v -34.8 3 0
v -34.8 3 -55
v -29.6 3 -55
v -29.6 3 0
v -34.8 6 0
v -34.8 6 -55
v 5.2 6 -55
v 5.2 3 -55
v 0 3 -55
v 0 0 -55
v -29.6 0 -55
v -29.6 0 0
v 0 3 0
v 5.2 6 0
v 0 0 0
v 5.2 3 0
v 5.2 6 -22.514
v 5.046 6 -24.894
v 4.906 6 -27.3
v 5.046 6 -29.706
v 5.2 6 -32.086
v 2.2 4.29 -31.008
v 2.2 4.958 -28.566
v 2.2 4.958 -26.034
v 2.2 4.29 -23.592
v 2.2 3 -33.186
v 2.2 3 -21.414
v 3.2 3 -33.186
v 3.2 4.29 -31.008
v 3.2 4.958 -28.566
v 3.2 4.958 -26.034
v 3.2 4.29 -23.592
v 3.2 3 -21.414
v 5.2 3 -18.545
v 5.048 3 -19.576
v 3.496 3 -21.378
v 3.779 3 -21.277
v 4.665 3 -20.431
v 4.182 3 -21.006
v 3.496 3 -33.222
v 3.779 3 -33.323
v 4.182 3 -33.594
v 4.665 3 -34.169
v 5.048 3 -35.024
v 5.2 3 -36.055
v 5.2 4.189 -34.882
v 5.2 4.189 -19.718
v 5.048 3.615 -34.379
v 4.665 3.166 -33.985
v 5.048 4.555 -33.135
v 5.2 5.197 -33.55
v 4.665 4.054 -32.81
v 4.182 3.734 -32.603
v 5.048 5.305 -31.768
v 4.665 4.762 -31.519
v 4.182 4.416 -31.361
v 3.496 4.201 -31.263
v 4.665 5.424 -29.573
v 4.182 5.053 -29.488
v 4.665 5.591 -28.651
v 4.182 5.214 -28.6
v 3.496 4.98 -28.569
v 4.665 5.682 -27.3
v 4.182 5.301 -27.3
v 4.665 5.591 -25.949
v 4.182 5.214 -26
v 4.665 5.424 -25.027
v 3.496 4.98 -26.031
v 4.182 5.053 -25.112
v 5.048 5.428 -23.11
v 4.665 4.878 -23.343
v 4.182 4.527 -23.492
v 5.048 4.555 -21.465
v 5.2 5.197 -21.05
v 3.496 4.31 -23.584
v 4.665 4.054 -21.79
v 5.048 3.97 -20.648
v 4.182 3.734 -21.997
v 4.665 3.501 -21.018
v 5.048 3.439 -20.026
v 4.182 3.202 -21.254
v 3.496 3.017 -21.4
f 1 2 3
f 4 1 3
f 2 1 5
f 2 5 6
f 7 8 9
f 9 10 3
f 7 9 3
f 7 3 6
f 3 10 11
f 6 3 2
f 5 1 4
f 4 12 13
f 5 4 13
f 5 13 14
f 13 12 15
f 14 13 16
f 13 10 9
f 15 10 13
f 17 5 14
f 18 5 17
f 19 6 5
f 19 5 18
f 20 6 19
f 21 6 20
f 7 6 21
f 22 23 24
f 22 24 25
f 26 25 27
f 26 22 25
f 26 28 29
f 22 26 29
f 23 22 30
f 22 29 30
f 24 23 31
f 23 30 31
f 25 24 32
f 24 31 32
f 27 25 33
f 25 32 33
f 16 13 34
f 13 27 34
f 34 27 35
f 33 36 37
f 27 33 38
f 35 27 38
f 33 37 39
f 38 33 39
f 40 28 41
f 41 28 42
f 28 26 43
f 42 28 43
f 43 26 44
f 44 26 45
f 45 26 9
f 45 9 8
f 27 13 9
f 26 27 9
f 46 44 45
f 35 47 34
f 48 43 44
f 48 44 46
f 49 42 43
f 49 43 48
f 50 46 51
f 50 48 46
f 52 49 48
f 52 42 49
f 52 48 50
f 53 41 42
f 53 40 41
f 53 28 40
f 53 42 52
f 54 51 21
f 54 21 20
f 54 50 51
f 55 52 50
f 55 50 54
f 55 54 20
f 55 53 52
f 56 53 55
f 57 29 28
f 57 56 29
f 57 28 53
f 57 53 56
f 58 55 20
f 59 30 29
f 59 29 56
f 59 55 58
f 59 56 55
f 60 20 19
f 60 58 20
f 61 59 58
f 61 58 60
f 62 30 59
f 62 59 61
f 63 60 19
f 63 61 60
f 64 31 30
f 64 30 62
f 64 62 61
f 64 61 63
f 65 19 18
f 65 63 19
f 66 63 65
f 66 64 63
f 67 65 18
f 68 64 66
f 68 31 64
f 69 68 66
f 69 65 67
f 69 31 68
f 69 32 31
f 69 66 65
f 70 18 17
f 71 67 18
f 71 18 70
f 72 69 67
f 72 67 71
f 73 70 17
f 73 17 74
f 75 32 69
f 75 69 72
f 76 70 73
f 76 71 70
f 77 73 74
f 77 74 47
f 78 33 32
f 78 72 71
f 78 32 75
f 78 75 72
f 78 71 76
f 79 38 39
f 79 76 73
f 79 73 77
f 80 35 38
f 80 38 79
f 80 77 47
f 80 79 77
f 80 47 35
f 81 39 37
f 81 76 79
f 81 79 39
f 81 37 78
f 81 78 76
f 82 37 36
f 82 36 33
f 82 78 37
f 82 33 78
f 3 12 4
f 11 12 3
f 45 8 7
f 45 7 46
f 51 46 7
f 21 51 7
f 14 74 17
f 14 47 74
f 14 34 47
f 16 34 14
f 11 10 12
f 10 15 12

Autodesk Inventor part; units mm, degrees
ref_plane "YZ Plane" through (0, 0, 0) normal (1, 0, 0) x (0, 1, 0)
ref_plane "XZ Plane" through (0, 0, 0) normal (0, 1, 0) x (-1, 0, 0)
ref_plane "XY Plane" through (0, 0, 0) normal (0, 0, 1) x (1, 0, 0)
sketch "스케치1" plane through (0, 0, 0) normal (0, 1, 0) x (-1, 0, 0)
  line L0 (0, 0) -> (29.6, 0)
  line L1 (29.6, 0) -> (29.6, -55)
  line L2 (29.6, -55) -> (0, -55)
  line L3 (0, -55) -> (0, 0)
  dimension "d0" = 29.6
  dimension "d1" = 55
extrude "돌출1" add sketch "스케치1" along normal blind 3
sketch "스케치2" plane through (0, 3, 0) normal (0, 1, 0) x (1, 0, 0)
  line L0 (0, 55) -> (-29.6, 55) projected
  line L1 (-29.6, 55) -> (-29.6, 0) projected
  line L2 (-29.6, 0) -> (0, 0) projected
  line L3 (0, 0) -> (0, 55) projected
  line L4 (5.2, 0) -> (-34.8, 0)
  line L5 (-34.8, 0) -> (-34.8, 55)
  line L6 (-34.8, 55) -> (5.2, 55)
  line L7 (5.2, 55) -> (5.2, 0)
  line L8 (0, 55) -> (-29.6, 55) projected
  point P0 (-14.8, 0)
  point P1 (0, 55)
  point P2 (-29.6, 55)
  dimension "d4" = 40
  dimension "d5" = 20
extrude "돌출2" add sketch "스케치2" along normal blind 3
sketch "스케치3" plane through (5.2, 3, 0) normal (1, 0, 0) x (0, 0, -1)
  line L0 (0, 0) -> (55, 0) projected
  line L1 (55, 0) -> (55, 3) projected
  line L2 (0, 3) -> (55, 3) projected
  line L3 (0, 0) -> (0, 3) projected
  circle A0 centre (27.3, -7.4568) radius 9.5
  point P0 (0, -3)
  point P1 (33.1861, 0)
  point P2 (21.4139, 0)
  dimension "d8" = 19
extrude "돌출3" cut sketch "스케치3" against normal blind 3 contours A0 L0 picked at (27.9995, 0.6028)
fillet "모깎기1" radius 2 1 edges at (5.2, 5.0432, -27.3)
properties part number "motor cover1"
